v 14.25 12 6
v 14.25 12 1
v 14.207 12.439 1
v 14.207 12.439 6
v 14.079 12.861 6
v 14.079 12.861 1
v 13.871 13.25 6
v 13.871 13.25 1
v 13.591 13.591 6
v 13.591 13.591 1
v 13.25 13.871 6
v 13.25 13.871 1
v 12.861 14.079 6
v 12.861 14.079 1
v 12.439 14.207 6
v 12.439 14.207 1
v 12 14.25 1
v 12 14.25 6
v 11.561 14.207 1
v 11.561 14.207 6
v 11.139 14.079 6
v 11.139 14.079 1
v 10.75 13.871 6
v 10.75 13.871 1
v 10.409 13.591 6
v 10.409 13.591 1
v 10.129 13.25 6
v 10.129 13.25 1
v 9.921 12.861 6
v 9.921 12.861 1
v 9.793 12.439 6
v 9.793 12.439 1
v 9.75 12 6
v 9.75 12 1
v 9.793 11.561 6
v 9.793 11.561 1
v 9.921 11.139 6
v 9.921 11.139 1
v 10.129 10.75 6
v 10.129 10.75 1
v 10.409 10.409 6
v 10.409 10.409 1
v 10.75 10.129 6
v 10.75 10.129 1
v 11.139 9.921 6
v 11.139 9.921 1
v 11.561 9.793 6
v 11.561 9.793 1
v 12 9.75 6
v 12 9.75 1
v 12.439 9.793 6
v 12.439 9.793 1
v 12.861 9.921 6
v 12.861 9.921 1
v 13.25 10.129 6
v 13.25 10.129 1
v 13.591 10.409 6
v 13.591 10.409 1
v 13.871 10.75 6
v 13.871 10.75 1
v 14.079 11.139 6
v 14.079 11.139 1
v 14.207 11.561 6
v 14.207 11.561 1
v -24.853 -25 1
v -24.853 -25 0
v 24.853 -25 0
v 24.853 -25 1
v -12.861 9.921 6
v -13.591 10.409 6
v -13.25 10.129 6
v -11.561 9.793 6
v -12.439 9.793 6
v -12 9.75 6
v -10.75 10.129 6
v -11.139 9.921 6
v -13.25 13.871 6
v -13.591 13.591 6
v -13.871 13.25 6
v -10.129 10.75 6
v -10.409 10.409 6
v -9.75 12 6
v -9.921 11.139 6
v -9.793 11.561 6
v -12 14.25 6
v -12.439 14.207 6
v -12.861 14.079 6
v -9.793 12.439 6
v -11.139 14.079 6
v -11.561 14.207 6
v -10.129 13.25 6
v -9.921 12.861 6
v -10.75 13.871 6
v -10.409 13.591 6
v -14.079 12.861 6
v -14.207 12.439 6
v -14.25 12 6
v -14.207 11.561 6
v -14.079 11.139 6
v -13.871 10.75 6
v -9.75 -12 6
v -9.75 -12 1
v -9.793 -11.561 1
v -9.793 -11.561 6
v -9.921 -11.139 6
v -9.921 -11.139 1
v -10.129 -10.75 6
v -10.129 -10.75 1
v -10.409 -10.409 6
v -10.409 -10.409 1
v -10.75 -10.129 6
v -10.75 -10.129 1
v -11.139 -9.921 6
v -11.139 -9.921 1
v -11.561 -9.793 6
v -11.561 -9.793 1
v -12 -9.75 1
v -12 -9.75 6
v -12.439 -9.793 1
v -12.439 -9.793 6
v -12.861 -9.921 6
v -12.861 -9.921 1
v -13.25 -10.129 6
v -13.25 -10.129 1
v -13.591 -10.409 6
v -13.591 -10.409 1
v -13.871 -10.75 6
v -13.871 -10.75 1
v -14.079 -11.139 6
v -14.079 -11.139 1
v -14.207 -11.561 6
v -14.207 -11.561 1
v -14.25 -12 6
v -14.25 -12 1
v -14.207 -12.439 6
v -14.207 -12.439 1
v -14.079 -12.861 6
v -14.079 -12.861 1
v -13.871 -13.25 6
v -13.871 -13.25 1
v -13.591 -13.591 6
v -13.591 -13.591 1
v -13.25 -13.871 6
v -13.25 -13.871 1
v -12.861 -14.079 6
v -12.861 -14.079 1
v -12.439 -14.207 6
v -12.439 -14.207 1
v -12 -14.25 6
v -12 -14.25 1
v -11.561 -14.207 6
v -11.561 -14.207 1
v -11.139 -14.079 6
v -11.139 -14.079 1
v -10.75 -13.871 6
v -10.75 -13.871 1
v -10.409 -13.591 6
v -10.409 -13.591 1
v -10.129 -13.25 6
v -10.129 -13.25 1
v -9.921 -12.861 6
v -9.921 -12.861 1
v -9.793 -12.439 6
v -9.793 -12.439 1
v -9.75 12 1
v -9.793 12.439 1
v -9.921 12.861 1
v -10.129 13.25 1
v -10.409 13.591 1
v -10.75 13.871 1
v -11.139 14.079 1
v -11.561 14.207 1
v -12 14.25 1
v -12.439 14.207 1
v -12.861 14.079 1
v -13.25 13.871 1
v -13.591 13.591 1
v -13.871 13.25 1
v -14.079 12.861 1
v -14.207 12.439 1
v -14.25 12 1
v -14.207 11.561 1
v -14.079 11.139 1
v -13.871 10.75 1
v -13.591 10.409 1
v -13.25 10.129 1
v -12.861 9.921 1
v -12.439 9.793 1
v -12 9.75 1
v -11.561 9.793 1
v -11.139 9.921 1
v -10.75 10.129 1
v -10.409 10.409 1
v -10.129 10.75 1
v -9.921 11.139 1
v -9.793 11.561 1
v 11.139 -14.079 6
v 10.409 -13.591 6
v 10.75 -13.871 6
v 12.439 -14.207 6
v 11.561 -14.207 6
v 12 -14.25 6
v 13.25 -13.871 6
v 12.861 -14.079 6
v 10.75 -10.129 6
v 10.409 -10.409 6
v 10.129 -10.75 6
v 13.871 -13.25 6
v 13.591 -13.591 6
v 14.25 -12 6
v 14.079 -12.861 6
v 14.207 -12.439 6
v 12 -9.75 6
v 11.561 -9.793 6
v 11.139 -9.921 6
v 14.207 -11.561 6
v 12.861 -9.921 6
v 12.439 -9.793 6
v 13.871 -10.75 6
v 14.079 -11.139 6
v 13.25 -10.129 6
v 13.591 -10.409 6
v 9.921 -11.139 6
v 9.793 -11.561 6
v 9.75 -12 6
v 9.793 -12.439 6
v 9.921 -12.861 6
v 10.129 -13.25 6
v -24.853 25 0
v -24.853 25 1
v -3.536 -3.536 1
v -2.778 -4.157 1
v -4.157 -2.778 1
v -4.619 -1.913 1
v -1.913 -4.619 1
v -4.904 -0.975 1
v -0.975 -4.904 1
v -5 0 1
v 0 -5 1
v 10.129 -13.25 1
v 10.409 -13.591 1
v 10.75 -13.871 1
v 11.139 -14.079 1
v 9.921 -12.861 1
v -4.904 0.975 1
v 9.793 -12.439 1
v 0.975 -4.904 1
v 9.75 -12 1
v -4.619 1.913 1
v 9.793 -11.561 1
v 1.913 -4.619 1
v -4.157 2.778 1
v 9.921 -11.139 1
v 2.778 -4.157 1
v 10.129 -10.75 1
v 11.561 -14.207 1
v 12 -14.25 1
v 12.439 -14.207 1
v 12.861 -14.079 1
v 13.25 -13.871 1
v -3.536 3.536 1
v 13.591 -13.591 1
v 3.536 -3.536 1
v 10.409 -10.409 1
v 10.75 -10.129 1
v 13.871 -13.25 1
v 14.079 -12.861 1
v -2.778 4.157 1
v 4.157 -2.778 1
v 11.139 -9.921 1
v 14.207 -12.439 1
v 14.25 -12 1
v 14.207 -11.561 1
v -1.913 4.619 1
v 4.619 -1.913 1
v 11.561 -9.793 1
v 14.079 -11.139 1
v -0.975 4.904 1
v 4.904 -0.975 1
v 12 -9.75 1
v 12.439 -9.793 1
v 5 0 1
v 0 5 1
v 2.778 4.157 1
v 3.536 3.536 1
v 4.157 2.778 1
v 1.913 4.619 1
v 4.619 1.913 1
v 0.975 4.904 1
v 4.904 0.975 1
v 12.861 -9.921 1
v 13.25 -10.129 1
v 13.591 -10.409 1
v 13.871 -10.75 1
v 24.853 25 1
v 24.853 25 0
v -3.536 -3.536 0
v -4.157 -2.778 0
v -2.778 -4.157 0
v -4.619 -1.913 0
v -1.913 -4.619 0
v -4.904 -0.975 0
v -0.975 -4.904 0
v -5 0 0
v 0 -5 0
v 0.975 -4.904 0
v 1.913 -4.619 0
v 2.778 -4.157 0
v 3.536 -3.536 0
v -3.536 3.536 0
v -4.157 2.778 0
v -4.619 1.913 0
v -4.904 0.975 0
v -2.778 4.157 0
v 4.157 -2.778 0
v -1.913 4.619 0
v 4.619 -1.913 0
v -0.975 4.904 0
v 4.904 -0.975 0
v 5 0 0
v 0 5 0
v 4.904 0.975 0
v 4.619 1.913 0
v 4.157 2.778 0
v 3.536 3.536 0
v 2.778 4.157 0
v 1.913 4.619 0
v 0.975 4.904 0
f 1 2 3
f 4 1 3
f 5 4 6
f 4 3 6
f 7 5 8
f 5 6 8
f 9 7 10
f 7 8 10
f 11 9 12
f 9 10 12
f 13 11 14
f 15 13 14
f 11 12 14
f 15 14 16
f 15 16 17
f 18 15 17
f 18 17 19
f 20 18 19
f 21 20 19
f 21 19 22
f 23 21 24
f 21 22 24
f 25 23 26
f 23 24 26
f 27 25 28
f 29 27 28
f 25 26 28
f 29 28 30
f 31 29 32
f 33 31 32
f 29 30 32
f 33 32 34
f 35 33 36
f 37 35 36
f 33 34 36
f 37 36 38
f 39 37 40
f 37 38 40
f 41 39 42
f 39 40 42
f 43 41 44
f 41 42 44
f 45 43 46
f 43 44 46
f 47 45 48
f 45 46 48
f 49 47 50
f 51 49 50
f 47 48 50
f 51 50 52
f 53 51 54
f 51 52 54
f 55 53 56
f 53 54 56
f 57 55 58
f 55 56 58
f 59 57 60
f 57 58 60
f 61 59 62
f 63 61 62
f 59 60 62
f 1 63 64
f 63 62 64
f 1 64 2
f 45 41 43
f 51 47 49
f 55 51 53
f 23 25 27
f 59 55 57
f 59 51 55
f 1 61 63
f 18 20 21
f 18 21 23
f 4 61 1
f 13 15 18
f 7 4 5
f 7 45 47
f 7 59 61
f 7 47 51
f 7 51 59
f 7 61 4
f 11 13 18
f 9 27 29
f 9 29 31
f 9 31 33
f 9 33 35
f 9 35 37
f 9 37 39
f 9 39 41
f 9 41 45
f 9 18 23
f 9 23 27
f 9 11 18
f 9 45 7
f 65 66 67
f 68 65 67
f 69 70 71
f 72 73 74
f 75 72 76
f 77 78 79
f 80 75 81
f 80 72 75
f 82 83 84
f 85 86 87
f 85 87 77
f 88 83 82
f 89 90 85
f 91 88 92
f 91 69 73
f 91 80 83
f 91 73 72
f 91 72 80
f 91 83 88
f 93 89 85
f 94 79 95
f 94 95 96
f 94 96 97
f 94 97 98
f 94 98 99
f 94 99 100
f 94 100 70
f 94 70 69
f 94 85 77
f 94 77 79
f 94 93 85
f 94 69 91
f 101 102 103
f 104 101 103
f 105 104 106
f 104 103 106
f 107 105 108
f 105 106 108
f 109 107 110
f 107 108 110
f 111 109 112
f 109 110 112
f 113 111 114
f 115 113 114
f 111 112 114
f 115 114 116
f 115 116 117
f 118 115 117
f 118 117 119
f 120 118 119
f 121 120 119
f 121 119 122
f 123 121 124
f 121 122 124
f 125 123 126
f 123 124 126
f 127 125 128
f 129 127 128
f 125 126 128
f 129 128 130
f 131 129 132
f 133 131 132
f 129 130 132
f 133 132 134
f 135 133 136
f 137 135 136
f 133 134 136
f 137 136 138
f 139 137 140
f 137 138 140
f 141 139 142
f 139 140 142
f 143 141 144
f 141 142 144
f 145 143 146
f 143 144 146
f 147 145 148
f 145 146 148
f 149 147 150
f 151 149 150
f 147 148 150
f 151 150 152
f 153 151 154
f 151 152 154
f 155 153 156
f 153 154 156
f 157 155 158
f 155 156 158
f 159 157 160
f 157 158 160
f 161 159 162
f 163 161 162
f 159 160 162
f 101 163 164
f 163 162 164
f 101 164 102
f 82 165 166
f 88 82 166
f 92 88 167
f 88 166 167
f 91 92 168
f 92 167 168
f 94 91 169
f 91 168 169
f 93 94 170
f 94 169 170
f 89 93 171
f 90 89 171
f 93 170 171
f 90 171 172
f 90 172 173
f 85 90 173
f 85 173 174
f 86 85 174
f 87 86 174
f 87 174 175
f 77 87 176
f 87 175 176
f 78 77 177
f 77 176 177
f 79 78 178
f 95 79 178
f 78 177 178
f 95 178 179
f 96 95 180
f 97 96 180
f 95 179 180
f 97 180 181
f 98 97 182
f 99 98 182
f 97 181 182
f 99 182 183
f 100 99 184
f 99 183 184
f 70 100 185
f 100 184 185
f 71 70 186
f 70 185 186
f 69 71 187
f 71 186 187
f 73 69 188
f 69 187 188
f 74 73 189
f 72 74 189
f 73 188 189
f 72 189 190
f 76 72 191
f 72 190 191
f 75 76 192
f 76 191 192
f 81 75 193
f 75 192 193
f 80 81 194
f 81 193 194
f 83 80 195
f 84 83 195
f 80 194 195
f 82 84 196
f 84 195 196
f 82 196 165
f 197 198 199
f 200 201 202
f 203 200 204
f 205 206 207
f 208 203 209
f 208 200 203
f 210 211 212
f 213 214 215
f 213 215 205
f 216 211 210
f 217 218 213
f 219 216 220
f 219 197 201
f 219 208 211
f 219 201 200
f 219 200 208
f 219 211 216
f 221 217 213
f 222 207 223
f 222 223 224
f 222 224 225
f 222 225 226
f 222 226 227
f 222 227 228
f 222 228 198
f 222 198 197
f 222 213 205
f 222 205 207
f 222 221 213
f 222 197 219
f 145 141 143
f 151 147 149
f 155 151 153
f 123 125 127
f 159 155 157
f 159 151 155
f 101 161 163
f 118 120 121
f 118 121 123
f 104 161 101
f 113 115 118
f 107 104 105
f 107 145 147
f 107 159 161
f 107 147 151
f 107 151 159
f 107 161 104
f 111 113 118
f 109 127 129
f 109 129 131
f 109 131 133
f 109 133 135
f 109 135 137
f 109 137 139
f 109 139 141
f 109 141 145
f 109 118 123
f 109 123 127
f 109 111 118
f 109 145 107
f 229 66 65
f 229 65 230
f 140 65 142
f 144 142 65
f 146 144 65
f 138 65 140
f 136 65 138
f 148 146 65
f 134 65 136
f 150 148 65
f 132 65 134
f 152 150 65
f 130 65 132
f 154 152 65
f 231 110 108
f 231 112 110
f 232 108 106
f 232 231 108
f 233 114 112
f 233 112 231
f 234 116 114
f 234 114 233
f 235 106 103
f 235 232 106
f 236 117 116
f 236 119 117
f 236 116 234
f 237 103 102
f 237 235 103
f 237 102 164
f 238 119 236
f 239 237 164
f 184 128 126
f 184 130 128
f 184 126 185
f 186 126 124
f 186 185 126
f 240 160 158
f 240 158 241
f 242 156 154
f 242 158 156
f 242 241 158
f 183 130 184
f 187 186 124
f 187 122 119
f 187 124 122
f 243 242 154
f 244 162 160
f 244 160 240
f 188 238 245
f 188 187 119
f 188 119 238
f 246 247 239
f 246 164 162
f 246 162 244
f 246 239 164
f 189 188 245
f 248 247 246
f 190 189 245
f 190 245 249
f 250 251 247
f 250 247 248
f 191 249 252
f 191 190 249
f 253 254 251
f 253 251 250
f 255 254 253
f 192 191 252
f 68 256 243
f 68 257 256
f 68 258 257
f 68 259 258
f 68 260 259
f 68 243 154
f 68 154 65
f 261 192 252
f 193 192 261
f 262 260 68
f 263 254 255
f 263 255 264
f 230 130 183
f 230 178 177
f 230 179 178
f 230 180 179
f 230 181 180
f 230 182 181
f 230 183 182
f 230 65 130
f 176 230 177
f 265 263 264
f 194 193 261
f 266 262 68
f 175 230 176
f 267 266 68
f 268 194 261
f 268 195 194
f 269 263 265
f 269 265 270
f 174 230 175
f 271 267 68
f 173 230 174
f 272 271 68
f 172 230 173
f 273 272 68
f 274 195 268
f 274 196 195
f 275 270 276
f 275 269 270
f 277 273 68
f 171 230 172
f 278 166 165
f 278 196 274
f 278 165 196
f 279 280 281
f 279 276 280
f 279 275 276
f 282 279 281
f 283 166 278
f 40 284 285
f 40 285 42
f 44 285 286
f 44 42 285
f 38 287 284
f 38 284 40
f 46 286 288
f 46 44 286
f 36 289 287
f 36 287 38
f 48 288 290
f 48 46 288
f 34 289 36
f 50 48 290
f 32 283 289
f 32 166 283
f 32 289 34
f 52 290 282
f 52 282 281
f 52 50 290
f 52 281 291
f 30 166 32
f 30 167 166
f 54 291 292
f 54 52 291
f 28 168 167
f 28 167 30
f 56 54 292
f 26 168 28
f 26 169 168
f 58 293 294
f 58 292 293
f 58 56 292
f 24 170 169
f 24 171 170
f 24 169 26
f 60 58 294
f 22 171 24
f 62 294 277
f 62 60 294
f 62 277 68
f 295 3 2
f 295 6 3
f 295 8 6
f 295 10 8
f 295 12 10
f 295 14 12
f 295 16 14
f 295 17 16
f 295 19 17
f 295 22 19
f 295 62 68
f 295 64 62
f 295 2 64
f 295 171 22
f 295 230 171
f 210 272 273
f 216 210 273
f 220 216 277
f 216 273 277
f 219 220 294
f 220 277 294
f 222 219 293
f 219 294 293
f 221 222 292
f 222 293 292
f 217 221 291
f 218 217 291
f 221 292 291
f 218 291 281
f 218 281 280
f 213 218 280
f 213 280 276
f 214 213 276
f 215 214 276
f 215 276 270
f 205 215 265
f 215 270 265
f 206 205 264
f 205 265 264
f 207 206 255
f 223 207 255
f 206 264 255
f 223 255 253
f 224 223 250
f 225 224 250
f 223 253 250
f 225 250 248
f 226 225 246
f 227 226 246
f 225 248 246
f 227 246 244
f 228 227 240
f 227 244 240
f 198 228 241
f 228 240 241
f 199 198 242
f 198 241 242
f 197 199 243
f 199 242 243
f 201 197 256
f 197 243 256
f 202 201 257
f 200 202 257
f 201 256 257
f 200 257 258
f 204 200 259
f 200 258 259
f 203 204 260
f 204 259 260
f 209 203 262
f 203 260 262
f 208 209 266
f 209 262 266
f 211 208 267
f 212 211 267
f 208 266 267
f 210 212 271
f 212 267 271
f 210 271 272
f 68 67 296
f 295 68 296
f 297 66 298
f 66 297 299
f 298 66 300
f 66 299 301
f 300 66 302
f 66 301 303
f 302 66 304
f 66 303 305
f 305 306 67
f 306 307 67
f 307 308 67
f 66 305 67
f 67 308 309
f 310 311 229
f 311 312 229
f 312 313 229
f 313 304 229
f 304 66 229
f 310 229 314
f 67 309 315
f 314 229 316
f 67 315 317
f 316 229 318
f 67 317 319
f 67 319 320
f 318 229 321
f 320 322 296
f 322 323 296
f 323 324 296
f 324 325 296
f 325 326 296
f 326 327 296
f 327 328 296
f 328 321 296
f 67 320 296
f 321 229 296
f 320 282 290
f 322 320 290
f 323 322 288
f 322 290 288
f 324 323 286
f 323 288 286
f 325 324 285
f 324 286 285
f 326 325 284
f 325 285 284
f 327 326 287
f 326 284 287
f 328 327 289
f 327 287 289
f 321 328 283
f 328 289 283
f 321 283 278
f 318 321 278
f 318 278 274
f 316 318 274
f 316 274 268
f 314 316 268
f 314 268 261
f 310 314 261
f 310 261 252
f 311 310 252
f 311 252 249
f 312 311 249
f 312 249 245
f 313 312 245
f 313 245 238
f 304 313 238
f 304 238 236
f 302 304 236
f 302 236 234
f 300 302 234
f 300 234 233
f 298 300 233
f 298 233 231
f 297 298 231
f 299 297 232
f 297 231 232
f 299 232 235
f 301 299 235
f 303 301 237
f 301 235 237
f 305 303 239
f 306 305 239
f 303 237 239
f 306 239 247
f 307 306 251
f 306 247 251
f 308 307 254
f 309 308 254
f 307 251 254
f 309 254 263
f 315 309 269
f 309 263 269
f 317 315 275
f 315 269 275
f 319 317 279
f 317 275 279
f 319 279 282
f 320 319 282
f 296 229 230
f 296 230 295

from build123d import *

# Parameters (mm, degrees)
F0_W     = 49.706
F0_H     = 50
F1_DEPTH = 1
F2_R     = 2.25
F3_DEPTH = 5
F4_R     = 5
F5_DEPTH = 25


with BuildPart() as f1:
    # F0 (on Top) → F1 (new body)
    with BuildSketch(Plane.XY):
        Rectangle(F0_W, F0_H)
    extrude(amount=F1_DEPTH)

    # F2 (on face) → F3 (join)
    with BuildSketch(Plane.XY.offset(1)):
        with Locations((-12, 12)):
            Circle(F2_R)
        with Locations((12, 12)):
            Circle(F2_R)
        with Locations((-12, -12)):
            Circle(F2_R)
        with Locations((12, -12)):
            Circle(F2_R)
    extrude(amount=F3_DEPTH)

    # F4 (on face) → F5 (cut)
    with BuildSketch(Plane.XY.offset(1)):
        Circle(F4_R)
    extrude(amount=-F5_DEPTH, mode=Mode.SUBTRACT)


solid = f1.part
